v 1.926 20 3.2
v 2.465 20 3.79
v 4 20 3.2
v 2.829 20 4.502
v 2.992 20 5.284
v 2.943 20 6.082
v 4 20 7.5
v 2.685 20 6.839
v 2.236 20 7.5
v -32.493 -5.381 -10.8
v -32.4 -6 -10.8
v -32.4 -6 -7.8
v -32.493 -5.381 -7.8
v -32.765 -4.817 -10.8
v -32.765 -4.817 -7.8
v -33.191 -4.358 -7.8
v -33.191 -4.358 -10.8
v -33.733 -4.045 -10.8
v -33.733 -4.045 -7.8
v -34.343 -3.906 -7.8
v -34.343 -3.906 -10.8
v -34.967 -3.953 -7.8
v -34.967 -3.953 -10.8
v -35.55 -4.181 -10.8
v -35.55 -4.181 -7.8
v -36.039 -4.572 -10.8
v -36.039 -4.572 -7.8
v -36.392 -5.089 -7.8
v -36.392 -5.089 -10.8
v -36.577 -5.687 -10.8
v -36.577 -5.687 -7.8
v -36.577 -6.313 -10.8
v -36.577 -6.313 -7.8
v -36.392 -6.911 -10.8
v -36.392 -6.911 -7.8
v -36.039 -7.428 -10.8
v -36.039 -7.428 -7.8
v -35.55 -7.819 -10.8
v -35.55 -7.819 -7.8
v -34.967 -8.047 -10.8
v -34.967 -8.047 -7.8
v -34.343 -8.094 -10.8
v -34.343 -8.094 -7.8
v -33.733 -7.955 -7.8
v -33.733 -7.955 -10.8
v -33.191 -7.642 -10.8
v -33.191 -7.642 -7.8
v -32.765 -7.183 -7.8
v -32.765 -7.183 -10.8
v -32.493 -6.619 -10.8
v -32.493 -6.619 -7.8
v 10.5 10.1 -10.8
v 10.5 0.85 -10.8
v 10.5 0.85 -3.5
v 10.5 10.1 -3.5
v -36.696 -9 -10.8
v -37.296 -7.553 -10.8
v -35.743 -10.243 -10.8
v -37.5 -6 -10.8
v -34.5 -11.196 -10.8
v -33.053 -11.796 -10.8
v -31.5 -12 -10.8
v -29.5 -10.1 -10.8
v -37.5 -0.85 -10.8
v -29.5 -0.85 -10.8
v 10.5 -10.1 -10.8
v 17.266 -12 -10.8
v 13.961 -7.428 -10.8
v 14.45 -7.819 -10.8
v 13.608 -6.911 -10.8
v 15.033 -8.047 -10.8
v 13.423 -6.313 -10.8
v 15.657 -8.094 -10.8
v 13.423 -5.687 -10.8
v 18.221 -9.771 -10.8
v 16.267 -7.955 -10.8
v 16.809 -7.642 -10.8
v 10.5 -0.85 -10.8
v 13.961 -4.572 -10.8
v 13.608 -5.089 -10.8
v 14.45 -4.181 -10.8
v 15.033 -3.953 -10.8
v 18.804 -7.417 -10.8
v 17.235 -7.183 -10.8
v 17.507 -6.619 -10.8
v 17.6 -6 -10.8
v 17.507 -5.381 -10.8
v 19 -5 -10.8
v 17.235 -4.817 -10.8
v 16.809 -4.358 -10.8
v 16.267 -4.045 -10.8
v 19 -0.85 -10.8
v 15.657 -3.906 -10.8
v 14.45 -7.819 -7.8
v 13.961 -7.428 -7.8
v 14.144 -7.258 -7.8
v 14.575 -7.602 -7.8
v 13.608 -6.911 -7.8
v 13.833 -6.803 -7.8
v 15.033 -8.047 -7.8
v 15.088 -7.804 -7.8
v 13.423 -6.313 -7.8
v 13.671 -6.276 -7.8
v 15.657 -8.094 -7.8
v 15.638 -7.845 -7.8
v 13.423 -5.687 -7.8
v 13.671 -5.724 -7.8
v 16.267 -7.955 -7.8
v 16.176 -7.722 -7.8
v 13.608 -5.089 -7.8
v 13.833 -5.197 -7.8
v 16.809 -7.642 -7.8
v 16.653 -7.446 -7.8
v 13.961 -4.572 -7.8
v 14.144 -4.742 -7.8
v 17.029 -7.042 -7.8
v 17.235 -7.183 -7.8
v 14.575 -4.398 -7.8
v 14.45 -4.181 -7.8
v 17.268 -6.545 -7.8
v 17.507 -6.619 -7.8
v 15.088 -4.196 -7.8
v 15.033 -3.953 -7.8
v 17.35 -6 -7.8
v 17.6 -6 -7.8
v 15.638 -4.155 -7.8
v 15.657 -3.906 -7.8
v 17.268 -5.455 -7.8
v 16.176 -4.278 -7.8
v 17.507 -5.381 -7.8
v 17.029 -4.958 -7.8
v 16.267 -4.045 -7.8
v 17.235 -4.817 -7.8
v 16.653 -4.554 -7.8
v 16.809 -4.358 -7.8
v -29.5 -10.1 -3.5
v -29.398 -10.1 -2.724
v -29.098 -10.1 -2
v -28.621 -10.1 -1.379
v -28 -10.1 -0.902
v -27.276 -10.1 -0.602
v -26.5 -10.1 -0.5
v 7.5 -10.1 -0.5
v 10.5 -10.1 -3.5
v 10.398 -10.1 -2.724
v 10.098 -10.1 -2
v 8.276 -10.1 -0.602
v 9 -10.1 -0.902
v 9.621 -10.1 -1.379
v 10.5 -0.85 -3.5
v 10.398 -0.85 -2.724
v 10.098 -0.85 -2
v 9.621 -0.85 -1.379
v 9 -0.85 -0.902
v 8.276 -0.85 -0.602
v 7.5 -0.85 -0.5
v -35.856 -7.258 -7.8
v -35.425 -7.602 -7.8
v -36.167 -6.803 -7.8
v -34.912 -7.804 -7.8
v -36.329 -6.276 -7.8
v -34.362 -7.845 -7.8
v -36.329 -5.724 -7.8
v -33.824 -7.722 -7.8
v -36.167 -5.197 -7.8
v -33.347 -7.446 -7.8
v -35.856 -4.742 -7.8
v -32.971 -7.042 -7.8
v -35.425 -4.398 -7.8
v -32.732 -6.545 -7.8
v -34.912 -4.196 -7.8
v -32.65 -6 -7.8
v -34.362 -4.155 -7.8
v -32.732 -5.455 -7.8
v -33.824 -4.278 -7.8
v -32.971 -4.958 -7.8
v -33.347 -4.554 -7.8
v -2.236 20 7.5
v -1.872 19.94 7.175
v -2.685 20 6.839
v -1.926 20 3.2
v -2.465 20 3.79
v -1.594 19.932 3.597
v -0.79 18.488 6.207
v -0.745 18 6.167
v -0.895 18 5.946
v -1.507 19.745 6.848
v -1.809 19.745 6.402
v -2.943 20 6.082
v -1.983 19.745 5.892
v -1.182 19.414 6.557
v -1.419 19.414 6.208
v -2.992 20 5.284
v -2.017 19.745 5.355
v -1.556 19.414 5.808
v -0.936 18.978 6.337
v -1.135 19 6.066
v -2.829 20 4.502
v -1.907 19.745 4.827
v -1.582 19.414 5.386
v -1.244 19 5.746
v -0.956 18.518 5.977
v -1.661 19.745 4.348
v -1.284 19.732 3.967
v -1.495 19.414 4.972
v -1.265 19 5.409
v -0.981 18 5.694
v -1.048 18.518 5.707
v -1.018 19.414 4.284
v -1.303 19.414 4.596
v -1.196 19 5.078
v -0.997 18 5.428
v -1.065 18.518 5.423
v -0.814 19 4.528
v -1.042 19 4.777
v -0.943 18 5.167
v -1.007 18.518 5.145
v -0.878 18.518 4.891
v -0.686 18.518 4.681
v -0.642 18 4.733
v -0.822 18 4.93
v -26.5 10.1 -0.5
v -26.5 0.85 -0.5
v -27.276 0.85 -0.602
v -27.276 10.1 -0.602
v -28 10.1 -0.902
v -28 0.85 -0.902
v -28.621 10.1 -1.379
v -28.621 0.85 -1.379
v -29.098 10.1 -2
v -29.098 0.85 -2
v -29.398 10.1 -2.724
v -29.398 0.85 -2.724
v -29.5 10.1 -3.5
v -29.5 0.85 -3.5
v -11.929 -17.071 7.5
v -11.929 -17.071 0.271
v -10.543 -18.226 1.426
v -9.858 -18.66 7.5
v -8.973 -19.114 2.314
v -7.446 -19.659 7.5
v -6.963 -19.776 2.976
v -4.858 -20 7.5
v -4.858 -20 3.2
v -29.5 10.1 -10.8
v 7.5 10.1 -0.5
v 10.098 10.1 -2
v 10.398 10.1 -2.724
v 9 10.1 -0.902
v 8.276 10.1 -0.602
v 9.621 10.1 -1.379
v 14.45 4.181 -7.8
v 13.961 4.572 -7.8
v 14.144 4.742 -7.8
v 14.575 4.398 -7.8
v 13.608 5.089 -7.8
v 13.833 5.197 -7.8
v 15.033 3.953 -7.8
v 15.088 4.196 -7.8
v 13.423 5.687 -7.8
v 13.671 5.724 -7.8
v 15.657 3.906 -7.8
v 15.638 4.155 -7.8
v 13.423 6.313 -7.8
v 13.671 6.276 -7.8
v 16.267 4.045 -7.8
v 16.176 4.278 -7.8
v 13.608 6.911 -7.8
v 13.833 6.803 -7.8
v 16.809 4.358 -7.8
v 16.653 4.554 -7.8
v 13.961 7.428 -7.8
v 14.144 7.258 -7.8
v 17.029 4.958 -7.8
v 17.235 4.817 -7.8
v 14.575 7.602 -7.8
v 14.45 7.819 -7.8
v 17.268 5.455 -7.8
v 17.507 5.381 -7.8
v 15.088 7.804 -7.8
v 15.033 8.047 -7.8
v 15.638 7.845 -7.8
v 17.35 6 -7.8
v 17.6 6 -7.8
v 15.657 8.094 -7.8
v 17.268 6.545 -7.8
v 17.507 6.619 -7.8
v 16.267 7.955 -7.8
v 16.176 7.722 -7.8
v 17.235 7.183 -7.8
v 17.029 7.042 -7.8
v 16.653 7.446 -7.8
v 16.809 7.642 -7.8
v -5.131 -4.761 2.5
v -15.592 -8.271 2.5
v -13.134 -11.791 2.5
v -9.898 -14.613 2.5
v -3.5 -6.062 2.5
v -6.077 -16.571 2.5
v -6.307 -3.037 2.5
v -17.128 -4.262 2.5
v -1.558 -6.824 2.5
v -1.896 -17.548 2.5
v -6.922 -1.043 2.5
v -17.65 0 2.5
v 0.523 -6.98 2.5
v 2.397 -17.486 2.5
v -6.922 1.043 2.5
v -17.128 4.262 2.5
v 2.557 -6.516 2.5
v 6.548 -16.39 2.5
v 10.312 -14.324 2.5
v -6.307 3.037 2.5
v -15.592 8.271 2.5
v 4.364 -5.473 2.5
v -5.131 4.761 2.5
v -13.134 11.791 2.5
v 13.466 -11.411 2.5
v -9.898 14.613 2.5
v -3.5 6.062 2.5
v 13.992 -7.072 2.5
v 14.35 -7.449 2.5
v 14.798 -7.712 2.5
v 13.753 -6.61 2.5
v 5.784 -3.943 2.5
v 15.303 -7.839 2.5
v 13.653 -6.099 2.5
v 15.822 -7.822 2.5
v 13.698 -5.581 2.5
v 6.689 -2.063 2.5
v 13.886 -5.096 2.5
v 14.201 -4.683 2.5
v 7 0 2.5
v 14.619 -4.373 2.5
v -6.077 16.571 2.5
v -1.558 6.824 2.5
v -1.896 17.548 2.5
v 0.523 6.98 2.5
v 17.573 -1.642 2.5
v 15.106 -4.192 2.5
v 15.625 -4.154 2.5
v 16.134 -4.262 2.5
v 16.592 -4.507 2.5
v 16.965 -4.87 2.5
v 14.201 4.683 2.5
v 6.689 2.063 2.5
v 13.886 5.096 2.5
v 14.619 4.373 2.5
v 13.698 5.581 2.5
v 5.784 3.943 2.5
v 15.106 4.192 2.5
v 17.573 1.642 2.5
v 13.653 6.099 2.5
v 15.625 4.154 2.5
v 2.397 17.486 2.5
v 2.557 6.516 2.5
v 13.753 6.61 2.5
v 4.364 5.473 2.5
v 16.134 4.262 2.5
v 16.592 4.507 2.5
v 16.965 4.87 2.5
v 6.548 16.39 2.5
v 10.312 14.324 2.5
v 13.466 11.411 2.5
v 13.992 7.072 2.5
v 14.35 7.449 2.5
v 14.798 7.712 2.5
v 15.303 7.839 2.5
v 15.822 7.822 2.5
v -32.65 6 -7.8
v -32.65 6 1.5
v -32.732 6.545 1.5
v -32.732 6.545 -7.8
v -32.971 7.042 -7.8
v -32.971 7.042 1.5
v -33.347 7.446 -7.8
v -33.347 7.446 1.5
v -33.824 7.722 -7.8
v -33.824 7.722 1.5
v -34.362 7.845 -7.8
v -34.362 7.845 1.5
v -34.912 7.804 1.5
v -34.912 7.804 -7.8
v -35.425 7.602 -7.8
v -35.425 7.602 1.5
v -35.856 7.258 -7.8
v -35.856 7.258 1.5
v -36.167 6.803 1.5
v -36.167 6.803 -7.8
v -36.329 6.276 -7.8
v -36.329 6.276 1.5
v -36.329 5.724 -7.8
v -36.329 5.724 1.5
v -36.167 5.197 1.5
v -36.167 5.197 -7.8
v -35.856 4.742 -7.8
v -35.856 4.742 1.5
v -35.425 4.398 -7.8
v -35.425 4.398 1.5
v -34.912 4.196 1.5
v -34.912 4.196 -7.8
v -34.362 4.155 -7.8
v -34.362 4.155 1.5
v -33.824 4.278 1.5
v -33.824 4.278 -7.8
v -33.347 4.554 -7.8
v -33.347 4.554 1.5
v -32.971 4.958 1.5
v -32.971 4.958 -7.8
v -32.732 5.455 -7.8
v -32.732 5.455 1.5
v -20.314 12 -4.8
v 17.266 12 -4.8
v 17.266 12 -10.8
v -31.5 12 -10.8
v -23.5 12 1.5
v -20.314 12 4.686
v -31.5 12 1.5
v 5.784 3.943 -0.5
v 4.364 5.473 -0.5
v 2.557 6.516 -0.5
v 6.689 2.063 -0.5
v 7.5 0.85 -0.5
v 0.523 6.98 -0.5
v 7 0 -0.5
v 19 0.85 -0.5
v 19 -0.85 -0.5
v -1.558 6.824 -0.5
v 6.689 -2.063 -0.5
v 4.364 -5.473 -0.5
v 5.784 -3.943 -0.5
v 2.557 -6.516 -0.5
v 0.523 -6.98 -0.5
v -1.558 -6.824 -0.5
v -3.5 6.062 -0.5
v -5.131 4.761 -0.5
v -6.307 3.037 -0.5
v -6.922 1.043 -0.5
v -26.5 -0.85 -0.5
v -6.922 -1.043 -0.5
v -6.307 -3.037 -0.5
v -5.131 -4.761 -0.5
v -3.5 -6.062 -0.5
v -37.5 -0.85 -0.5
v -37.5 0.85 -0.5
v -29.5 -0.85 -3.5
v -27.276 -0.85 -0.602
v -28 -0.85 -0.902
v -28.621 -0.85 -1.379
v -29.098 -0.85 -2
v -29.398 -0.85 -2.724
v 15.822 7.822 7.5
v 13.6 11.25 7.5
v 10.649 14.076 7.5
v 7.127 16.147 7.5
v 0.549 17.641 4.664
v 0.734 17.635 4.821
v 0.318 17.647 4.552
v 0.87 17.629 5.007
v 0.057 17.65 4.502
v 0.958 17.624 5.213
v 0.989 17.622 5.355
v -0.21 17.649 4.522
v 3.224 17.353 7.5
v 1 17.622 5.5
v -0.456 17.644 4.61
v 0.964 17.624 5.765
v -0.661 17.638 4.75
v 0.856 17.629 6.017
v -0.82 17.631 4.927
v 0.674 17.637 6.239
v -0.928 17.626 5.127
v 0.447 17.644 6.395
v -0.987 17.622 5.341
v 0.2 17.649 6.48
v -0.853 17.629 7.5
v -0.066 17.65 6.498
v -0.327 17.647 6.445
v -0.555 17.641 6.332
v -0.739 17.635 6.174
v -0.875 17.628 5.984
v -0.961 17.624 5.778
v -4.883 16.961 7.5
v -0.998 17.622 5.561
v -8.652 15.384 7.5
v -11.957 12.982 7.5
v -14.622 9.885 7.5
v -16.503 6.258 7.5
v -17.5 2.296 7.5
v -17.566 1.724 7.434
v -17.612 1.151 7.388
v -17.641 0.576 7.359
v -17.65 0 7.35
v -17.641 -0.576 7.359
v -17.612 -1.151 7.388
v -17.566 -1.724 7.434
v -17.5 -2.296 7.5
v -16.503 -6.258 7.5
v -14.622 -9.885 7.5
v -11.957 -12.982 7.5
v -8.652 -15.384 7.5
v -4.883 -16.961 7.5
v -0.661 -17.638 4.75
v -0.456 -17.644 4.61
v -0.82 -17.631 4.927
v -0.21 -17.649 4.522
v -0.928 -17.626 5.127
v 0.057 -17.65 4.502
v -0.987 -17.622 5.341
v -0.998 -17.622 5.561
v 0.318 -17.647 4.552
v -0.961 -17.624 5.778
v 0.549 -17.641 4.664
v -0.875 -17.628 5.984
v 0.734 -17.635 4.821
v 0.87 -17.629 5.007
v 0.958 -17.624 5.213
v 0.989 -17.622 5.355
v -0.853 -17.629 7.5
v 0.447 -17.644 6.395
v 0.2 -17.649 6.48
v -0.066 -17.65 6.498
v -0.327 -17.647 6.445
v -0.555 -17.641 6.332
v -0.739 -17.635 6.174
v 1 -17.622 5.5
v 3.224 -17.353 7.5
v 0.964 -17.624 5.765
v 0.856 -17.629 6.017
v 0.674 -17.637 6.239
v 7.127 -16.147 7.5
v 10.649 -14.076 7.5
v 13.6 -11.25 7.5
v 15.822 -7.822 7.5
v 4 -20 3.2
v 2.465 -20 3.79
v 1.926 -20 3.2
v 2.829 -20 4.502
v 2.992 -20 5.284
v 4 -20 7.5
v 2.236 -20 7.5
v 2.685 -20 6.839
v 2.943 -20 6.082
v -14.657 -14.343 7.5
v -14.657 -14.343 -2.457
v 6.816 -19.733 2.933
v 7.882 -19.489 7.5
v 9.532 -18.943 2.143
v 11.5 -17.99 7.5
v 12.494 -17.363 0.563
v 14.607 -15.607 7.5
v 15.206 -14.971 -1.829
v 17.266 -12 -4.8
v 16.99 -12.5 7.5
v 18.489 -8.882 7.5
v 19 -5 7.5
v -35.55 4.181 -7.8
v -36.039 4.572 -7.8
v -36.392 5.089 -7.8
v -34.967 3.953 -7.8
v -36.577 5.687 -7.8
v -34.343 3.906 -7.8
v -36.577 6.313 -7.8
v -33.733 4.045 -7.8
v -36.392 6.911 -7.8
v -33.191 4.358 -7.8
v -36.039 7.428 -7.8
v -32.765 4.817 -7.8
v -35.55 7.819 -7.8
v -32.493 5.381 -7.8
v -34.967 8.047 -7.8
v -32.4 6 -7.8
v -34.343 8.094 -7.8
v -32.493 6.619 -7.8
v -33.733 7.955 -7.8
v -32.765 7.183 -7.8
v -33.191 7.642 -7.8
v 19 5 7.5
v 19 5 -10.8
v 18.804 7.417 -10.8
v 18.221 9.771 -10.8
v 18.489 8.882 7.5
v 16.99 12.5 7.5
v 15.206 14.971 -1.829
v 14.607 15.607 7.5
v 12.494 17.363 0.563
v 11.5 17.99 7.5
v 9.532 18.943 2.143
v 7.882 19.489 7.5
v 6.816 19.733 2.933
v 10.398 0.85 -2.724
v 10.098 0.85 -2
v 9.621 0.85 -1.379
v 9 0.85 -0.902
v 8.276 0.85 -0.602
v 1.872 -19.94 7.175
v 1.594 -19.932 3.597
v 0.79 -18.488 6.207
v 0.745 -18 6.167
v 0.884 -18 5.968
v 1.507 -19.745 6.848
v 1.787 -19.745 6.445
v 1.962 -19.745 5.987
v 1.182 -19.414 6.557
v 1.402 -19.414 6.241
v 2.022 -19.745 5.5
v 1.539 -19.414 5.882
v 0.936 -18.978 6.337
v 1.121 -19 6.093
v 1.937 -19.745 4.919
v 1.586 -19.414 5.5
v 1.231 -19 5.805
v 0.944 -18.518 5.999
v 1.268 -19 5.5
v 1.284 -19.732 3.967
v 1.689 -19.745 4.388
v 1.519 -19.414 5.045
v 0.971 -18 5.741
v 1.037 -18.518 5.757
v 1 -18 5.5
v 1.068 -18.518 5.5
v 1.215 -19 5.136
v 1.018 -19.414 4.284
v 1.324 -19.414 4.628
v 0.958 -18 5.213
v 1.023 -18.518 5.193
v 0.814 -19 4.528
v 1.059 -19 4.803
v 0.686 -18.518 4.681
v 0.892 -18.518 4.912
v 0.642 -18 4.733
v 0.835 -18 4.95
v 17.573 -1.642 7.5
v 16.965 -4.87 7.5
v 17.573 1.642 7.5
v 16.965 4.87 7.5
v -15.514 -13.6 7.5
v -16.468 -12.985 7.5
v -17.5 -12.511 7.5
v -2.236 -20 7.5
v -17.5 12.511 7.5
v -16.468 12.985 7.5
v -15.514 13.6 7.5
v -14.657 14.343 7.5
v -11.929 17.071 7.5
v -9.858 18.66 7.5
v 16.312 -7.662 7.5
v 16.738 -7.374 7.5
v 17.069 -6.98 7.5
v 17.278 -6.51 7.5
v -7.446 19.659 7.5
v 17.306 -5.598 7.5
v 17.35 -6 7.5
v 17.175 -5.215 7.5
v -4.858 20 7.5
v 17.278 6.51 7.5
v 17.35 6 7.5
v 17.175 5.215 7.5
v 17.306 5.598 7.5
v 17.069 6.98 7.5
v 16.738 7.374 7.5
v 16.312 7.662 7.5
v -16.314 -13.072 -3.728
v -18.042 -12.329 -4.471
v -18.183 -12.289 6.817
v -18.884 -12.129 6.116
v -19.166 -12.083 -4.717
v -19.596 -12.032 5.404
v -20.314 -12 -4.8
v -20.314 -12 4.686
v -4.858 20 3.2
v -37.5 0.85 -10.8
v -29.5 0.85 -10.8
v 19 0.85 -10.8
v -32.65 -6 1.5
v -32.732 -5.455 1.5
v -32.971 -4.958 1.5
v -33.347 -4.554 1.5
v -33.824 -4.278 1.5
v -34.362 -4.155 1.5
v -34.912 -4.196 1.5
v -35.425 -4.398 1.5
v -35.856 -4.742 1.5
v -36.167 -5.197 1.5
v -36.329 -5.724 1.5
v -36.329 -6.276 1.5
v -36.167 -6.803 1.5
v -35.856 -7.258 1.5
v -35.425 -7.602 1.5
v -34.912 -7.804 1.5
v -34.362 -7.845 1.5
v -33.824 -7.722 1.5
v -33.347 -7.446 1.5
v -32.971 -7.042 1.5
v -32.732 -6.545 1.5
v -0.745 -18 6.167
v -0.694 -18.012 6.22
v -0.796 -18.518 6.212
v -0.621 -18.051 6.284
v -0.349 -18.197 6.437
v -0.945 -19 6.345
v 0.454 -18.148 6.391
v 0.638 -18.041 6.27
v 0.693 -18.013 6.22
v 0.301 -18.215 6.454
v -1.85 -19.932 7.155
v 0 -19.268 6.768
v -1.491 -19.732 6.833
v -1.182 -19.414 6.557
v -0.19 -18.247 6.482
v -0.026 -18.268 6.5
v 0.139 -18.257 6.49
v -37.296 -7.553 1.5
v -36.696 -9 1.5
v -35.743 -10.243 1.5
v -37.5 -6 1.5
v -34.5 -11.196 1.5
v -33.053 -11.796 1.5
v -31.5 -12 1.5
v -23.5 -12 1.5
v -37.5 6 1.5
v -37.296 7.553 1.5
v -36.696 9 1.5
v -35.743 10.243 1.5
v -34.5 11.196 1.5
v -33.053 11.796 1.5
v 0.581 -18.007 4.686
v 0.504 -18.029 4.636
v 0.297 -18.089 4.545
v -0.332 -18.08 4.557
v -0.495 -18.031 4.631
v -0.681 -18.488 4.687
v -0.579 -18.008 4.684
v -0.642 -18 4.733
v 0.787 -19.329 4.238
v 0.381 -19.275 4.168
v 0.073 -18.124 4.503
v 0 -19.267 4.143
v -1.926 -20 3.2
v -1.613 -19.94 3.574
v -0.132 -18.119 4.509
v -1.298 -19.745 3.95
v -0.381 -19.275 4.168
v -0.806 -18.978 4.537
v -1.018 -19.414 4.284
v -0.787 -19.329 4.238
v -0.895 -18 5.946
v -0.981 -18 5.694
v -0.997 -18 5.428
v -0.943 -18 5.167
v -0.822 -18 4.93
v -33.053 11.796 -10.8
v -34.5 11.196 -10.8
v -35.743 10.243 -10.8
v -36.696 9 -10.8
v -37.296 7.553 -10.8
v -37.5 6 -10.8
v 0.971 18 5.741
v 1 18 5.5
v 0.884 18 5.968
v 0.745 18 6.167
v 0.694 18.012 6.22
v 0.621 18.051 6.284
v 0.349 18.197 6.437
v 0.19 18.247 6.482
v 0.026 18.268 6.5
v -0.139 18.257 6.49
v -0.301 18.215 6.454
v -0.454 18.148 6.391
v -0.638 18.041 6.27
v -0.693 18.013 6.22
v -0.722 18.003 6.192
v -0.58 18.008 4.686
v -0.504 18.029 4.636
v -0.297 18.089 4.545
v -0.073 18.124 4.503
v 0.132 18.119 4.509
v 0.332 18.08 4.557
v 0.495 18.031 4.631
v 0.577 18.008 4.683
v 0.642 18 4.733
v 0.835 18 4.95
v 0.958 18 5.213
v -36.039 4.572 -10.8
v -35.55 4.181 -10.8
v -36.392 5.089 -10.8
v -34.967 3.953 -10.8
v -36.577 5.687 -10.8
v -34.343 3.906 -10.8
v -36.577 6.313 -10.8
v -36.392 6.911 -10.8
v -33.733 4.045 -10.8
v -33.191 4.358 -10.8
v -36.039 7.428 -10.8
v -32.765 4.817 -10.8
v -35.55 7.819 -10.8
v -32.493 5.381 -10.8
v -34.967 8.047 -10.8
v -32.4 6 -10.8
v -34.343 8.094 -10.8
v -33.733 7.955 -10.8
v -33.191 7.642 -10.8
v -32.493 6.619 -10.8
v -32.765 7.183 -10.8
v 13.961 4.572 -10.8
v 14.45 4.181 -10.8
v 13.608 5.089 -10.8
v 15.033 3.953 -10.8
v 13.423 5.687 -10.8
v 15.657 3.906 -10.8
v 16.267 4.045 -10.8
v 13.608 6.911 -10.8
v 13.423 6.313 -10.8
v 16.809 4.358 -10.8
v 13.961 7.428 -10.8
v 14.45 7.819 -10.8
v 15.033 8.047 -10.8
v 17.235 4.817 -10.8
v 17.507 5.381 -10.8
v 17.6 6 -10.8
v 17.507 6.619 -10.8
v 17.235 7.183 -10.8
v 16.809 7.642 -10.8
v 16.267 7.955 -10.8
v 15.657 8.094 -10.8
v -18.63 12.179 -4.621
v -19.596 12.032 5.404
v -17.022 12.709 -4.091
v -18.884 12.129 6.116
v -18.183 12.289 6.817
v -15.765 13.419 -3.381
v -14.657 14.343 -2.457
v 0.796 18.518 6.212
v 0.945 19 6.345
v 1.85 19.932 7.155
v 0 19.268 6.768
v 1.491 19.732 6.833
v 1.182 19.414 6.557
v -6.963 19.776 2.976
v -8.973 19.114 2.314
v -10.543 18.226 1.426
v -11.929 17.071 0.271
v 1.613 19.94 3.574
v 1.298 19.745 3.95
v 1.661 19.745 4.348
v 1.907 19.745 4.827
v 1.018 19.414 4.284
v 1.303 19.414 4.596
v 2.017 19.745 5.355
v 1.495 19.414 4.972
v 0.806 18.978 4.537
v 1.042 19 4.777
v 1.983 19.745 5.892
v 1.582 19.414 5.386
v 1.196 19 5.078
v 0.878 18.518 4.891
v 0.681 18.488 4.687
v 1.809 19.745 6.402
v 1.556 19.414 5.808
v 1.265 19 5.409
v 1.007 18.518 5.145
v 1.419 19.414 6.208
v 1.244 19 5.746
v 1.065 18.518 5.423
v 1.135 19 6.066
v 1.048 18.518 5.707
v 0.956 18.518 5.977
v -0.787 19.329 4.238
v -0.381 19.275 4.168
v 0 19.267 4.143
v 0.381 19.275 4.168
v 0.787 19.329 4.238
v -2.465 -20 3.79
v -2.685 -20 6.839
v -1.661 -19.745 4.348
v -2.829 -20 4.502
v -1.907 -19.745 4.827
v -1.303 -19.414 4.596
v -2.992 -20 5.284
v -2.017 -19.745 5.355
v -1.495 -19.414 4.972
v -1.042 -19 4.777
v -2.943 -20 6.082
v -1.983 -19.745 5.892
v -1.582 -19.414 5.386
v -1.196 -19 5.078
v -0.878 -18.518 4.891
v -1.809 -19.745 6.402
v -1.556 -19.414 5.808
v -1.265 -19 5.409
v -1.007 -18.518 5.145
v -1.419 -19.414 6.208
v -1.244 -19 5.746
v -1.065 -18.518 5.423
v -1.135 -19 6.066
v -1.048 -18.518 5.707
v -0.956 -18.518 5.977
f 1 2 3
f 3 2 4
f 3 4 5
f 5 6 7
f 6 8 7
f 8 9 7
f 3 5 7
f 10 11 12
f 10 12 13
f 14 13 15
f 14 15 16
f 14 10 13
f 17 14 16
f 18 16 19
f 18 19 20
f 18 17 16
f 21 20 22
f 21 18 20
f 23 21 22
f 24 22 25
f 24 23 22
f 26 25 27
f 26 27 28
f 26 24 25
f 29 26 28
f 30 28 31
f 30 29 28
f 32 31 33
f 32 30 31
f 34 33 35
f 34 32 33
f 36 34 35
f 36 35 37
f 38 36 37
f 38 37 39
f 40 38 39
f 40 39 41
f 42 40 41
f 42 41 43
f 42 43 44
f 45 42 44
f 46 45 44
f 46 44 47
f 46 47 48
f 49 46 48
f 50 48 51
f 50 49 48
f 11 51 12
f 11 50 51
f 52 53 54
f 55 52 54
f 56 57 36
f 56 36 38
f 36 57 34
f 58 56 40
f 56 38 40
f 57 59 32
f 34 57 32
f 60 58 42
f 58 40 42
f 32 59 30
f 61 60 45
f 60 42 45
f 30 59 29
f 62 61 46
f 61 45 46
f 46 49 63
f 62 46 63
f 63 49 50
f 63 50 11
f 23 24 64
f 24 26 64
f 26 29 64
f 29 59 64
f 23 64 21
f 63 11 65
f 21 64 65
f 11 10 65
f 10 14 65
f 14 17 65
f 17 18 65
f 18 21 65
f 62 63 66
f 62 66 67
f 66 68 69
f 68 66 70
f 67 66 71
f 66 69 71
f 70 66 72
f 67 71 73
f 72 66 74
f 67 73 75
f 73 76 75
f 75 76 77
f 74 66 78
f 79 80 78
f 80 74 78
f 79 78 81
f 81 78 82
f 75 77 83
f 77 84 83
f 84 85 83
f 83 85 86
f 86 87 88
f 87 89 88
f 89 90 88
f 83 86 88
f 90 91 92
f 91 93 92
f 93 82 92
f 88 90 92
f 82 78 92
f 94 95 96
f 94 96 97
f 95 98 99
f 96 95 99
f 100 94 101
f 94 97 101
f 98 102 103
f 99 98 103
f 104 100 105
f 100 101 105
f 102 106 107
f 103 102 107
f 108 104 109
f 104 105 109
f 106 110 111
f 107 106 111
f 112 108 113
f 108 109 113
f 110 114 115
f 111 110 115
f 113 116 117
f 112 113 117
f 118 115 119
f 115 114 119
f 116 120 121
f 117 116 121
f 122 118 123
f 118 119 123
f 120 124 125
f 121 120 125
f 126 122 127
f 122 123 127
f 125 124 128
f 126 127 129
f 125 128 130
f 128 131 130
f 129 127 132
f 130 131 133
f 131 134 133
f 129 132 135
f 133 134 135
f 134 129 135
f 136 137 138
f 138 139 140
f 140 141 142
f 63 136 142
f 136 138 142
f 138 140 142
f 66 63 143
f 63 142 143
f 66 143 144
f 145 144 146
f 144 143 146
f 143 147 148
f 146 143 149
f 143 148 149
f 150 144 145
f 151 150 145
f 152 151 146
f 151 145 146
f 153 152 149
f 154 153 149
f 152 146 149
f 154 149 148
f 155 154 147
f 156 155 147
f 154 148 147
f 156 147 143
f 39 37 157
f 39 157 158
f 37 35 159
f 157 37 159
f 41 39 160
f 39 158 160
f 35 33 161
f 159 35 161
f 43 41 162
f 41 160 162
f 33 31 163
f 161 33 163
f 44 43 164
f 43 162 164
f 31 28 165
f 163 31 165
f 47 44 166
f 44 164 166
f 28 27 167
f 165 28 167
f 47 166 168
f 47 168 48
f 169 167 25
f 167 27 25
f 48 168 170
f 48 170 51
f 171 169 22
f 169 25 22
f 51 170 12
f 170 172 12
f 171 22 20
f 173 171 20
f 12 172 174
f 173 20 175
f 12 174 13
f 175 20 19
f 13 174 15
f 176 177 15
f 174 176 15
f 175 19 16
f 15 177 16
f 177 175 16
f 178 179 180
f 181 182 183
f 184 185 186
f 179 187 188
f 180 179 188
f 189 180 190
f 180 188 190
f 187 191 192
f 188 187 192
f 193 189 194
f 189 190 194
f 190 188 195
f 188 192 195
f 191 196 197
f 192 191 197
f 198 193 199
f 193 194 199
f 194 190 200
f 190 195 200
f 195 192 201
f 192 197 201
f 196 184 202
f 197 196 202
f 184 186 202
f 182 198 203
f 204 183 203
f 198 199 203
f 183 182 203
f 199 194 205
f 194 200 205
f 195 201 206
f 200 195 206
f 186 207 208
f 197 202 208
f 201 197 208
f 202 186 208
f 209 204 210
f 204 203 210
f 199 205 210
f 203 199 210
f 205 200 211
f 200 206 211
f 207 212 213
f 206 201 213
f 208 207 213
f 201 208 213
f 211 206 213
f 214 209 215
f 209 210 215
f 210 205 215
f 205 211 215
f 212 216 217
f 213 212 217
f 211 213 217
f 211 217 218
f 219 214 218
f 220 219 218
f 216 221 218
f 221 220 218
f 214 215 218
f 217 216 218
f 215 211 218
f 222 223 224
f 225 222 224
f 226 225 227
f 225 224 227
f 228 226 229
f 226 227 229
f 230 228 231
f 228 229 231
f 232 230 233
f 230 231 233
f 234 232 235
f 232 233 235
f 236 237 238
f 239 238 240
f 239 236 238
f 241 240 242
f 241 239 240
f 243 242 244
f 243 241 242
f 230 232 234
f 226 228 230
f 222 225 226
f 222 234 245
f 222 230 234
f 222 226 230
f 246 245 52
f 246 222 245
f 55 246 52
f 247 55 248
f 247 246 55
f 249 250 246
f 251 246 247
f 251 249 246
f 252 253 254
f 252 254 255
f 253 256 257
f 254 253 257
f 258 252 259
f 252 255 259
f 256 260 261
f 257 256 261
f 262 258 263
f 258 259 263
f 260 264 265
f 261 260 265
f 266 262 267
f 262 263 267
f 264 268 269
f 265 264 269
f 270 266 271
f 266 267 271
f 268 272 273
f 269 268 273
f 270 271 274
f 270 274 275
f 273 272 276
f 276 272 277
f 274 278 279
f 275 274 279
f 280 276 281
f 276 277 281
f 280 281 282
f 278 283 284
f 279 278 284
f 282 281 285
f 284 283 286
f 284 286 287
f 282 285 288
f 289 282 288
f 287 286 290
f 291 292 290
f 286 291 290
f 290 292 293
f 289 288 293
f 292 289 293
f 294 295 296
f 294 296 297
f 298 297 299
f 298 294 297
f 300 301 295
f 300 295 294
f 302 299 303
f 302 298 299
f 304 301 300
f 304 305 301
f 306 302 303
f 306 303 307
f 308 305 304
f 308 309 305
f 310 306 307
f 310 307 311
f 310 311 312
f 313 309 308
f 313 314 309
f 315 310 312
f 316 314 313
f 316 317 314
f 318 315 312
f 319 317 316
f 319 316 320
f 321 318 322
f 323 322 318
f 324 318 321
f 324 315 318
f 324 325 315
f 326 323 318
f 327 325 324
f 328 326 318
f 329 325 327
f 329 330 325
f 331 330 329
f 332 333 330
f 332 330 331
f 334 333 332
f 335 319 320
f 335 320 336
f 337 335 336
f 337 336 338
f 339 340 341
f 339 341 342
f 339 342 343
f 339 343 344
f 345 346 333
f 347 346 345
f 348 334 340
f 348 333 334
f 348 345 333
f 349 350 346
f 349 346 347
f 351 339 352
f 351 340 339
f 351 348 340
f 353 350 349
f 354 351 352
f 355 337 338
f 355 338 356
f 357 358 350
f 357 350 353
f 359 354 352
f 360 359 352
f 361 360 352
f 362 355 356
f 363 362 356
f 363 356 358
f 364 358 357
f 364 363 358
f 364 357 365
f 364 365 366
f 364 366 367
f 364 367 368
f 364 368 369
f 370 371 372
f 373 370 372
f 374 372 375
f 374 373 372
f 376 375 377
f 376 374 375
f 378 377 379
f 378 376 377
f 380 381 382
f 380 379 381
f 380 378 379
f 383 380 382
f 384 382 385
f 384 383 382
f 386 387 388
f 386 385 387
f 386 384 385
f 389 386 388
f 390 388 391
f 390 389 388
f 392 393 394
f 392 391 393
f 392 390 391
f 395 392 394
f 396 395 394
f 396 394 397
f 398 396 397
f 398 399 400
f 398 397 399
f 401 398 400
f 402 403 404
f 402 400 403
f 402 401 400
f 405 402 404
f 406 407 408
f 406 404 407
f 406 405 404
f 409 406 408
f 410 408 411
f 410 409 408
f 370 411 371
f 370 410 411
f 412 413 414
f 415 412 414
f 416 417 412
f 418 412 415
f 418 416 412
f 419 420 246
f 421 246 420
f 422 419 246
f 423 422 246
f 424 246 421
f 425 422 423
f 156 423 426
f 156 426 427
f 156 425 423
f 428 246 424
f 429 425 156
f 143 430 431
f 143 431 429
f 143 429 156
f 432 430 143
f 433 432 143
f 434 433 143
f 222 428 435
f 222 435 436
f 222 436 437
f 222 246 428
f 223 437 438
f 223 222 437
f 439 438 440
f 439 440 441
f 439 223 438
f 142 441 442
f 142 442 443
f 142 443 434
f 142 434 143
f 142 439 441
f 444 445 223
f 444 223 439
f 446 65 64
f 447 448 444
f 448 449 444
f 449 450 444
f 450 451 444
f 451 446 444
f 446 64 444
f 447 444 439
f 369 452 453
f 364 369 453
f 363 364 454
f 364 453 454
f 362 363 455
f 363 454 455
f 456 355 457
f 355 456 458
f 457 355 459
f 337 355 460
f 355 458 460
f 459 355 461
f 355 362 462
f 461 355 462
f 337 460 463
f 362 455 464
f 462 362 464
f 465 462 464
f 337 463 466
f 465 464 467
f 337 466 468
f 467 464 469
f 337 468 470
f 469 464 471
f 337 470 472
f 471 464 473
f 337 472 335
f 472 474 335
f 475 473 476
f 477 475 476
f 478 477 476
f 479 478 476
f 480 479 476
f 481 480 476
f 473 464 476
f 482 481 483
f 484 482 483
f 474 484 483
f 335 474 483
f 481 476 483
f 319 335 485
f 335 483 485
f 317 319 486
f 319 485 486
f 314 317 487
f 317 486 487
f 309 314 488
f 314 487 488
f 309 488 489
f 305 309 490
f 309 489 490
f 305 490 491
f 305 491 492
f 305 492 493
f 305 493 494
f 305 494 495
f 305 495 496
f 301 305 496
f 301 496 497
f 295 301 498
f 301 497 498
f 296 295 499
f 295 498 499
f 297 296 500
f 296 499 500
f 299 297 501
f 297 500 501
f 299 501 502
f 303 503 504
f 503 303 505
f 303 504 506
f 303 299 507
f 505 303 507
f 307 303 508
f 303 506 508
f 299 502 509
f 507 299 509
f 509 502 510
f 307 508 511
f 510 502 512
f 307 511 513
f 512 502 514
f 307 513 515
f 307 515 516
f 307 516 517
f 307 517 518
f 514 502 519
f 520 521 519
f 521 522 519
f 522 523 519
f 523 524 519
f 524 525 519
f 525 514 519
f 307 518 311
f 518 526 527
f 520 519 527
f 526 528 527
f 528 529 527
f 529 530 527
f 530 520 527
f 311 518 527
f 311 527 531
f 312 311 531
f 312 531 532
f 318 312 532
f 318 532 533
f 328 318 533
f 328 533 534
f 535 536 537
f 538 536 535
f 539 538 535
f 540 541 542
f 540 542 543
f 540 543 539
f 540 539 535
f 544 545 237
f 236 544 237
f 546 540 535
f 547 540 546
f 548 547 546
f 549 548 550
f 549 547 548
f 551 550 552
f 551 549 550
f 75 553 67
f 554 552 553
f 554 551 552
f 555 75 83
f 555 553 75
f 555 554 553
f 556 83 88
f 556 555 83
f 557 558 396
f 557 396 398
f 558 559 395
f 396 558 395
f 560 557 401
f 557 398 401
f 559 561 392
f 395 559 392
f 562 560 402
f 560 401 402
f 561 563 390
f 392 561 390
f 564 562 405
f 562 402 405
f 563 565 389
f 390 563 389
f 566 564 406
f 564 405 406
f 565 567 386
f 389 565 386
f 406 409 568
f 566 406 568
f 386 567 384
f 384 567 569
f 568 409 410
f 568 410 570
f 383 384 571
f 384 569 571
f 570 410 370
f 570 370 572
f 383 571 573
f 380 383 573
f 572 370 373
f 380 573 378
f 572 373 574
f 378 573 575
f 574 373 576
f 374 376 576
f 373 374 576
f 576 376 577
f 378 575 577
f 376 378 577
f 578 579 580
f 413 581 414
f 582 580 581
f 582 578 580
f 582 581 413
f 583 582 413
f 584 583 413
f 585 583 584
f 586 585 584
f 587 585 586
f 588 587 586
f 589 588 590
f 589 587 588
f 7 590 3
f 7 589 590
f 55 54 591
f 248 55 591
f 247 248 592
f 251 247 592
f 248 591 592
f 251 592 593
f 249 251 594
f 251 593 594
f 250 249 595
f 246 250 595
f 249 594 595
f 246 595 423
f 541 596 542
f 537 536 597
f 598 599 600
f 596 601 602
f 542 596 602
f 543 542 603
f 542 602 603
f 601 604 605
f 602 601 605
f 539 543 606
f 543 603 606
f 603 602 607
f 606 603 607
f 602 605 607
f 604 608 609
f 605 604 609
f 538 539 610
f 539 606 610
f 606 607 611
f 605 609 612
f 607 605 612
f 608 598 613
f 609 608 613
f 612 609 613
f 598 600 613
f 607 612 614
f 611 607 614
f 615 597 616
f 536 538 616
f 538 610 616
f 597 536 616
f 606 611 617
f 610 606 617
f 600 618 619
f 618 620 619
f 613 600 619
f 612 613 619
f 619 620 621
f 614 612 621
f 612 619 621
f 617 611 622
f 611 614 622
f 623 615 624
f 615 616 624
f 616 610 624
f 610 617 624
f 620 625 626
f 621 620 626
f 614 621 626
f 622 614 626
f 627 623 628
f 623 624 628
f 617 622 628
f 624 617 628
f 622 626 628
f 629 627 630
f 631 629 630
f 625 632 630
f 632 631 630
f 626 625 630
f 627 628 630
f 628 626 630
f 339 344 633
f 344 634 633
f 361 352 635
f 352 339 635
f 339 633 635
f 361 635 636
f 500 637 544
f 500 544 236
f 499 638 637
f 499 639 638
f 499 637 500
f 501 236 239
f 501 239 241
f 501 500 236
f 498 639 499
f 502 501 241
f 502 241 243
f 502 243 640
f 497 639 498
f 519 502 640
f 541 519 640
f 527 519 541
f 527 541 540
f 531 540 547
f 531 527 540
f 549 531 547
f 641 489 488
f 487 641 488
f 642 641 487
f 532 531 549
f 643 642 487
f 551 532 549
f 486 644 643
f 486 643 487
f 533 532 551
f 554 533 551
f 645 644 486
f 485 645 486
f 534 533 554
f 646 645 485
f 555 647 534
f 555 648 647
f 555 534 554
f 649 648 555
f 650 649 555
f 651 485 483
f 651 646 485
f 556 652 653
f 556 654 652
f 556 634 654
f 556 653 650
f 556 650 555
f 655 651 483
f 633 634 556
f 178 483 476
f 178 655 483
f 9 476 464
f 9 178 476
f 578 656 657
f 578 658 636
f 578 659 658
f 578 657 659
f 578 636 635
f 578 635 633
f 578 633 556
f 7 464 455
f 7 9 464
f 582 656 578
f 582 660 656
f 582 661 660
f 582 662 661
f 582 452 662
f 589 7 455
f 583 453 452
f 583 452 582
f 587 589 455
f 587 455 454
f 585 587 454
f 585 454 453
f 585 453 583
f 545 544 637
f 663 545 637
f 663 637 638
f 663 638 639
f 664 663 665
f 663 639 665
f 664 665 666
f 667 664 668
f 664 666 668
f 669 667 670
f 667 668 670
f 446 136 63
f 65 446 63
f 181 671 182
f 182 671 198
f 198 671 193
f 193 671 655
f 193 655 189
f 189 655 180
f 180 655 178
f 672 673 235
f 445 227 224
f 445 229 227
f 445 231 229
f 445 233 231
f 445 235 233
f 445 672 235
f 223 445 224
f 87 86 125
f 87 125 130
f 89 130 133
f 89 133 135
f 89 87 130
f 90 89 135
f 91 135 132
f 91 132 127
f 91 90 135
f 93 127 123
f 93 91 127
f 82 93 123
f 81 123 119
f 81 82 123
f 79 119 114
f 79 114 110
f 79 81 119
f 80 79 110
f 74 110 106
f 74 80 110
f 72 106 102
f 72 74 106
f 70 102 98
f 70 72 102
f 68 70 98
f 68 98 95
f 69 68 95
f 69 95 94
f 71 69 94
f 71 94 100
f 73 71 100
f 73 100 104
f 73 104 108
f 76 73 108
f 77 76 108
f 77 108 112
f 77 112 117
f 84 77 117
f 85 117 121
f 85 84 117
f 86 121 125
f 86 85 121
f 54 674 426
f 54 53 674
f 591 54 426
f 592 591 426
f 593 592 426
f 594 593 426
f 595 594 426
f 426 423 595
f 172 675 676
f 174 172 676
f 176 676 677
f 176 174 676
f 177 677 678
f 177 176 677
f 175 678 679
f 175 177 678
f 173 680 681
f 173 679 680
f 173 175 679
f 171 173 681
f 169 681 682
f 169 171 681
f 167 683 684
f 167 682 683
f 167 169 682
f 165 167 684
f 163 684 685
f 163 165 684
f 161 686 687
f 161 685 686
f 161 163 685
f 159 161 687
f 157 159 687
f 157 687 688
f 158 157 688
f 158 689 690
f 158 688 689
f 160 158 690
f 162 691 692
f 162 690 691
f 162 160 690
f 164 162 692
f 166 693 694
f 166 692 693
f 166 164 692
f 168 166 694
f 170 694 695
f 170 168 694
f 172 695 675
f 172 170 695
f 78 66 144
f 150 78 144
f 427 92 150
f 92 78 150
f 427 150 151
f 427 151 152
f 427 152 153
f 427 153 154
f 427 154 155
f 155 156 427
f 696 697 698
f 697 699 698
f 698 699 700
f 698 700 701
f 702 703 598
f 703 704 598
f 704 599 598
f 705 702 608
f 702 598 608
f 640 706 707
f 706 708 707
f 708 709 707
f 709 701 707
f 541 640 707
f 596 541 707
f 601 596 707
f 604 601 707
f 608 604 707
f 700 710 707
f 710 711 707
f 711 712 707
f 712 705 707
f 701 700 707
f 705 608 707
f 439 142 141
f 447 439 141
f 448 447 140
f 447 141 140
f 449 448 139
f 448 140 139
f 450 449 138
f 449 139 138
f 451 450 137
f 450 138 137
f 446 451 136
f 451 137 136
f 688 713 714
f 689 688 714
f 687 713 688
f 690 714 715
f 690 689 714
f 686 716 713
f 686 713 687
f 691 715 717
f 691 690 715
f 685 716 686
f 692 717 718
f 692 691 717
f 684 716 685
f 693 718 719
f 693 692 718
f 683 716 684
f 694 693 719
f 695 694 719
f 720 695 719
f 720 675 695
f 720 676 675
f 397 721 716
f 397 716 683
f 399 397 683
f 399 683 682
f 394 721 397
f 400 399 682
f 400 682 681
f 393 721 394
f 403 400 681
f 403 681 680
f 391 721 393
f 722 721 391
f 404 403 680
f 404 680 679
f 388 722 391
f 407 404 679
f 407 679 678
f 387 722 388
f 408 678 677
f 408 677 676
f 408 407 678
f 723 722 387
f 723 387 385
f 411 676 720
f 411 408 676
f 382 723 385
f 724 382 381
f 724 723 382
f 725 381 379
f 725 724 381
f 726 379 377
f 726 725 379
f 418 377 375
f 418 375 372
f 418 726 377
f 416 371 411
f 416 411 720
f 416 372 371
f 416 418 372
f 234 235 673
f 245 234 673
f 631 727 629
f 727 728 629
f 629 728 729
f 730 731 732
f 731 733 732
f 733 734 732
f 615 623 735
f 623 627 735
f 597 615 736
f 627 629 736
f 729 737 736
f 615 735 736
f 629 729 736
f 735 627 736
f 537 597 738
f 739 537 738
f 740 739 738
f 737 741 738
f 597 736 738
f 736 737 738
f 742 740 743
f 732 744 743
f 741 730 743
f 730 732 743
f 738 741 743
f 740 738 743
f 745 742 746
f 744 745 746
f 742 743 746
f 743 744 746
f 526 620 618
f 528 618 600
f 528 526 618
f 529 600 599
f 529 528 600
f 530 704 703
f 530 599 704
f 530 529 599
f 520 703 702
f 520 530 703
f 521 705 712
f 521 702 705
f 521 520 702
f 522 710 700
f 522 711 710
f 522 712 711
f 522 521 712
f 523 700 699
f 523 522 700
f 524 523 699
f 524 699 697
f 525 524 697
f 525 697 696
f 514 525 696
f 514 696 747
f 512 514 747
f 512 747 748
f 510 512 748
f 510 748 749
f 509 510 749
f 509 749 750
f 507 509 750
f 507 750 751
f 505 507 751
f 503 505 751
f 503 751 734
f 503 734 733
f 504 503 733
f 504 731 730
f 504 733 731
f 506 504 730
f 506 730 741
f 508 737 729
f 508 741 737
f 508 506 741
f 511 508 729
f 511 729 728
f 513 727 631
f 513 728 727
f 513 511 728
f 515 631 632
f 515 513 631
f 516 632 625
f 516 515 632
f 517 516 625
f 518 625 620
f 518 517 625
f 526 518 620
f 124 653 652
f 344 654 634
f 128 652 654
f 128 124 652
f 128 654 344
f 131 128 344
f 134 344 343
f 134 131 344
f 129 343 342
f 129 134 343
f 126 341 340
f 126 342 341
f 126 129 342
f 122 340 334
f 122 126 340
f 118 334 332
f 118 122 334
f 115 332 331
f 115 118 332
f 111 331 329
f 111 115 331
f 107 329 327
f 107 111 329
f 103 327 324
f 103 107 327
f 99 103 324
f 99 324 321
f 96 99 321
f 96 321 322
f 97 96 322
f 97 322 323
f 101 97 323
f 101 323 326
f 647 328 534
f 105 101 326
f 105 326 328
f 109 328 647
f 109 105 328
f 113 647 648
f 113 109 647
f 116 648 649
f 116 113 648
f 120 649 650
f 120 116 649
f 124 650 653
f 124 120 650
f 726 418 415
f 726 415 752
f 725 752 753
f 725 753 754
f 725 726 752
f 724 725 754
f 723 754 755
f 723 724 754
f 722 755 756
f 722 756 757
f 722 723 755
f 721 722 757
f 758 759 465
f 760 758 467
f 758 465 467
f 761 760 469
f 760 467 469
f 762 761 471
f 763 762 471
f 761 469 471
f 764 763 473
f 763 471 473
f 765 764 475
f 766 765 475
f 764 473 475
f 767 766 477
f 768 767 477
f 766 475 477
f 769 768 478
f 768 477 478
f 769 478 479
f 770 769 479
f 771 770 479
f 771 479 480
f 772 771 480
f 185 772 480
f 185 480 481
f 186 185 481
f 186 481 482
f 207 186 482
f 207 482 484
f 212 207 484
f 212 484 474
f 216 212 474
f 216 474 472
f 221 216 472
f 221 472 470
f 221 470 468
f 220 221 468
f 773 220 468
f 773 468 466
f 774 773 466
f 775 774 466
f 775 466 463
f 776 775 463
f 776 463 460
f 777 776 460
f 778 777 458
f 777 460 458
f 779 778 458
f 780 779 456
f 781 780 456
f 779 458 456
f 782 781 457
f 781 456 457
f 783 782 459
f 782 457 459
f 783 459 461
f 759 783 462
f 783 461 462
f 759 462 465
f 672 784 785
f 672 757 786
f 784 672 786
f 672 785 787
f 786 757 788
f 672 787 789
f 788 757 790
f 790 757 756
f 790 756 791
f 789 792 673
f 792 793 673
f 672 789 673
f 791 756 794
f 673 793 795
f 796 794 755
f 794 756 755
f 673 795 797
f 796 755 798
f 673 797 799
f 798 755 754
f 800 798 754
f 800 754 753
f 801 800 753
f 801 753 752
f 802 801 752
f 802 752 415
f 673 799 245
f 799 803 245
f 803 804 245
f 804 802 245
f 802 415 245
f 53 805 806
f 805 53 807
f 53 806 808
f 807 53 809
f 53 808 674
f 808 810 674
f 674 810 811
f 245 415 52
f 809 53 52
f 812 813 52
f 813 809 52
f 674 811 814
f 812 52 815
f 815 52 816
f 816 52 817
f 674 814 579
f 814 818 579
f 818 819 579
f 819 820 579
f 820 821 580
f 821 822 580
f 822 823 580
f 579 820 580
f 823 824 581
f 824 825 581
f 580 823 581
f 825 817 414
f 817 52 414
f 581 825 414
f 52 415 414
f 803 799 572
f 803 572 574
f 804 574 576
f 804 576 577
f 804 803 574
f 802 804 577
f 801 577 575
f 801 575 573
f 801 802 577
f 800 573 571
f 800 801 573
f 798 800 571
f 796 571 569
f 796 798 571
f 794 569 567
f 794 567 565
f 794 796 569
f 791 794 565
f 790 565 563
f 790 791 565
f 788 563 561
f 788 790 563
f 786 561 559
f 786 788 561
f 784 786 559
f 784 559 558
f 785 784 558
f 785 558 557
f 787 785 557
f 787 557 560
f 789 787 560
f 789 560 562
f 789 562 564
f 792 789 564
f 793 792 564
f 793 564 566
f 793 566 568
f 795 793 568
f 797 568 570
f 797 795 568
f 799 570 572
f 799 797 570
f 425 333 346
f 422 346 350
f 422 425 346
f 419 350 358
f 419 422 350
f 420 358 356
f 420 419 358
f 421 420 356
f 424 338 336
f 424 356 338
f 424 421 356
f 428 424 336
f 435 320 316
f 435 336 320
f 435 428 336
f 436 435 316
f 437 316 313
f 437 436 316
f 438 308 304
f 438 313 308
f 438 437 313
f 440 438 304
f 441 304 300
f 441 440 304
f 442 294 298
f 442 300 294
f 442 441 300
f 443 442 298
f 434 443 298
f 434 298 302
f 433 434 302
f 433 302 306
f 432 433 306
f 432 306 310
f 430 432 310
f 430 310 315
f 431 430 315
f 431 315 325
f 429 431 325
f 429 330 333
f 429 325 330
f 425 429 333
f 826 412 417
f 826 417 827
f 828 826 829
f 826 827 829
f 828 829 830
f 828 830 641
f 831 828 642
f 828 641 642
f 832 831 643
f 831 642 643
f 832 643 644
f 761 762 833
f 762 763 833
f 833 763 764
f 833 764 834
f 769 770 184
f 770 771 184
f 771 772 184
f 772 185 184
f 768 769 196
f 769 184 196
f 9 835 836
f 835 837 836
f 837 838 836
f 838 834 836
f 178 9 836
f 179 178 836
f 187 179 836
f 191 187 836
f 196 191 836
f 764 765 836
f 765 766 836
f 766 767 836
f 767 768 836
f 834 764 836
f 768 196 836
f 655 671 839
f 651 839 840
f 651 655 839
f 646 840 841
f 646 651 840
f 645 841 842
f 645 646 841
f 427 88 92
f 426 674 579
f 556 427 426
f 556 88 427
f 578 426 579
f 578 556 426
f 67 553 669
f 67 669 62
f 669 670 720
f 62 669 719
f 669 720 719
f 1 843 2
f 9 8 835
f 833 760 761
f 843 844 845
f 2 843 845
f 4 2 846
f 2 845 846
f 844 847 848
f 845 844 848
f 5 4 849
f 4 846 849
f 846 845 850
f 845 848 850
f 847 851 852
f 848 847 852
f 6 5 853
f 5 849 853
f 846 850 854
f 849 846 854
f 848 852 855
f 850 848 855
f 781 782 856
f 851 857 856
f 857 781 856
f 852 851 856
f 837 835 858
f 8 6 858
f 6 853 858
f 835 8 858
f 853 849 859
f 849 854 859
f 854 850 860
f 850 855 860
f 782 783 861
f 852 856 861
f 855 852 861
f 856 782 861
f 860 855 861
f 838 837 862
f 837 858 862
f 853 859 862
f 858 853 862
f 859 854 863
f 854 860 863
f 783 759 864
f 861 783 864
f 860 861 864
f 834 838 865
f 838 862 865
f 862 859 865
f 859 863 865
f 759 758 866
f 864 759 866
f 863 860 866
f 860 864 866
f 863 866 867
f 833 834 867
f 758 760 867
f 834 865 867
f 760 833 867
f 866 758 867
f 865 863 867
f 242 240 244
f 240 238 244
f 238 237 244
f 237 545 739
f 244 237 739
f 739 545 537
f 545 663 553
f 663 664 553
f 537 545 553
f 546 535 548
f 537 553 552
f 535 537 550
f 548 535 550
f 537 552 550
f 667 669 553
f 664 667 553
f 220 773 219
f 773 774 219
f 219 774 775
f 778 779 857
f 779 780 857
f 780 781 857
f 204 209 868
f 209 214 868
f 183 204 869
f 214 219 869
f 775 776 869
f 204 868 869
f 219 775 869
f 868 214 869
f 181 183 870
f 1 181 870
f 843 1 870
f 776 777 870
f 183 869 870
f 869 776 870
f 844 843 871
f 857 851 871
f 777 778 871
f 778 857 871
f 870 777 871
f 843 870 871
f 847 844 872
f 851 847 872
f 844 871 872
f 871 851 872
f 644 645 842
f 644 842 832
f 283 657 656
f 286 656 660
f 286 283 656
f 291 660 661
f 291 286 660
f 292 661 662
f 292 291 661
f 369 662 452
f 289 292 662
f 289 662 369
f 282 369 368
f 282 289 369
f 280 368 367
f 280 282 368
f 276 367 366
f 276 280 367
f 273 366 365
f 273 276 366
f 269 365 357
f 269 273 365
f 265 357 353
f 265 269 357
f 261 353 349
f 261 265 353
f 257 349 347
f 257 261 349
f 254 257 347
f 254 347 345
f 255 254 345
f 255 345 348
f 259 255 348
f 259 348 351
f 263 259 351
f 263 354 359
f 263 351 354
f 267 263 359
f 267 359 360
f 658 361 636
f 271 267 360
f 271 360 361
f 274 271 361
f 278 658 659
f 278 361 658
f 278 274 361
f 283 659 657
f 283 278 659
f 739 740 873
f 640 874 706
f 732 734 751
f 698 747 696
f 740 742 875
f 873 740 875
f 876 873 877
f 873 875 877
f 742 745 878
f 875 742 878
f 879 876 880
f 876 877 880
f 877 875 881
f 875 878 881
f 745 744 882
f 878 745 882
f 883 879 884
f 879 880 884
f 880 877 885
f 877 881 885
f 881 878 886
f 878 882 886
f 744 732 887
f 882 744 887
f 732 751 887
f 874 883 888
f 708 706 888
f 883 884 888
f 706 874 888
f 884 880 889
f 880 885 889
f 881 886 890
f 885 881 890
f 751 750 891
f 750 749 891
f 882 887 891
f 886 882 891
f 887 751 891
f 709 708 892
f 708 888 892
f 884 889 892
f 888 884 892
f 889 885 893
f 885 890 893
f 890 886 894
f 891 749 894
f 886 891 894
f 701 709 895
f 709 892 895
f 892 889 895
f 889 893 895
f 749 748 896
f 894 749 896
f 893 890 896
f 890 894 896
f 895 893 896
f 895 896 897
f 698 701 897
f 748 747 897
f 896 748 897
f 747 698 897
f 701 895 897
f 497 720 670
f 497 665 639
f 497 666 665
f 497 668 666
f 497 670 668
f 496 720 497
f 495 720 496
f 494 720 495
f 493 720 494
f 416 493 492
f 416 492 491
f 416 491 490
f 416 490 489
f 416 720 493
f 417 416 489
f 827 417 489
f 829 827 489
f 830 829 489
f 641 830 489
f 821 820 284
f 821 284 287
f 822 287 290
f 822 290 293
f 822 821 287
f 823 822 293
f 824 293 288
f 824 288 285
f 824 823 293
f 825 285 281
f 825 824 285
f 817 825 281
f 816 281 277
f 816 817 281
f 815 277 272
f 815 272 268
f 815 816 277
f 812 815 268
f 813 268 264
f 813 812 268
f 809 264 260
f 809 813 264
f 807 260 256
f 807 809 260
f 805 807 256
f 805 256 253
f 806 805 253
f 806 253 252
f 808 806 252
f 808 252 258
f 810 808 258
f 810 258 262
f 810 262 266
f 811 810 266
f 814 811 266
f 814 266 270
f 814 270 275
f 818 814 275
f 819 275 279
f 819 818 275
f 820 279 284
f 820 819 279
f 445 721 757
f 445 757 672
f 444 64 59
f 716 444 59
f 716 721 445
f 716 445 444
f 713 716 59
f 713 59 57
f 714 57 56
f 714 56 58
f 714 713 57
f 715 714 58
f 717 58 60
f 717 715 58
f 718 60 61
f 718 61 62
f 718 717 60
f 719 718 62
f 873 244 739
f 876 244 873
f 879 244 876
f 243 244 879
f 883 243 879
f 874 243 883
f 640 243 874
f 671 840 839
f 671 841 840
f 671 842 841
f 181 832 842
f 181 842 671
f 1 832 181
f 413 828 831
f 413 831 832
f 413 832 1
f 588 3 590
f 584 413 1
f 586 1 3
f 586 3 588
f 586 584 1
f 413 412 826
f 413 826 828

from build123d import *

# Parameters (mm, degrees)
SKETCH035_R          = 7
SKETCH035_R_2        = 1.85
PAD031_DEPTH         = 8
PAD031_DEPTH_BACK    = 10.3
POCKET036_DEPTH      = 10.1
SKETCH070_W          = 1.7
SKETCH070_H          = 20
POCKET037_DEPTH      = 56.501
SKETCH043_R          = 17.65
POCKET038_DEPTH      = 5
POCKET039_DEPTH      = 20.001
POCKET039_DEPTH_BACK = 20.001
POCKET040_DEPTH      = 167.7091
POCKET040_DEPTH_BACK = 175.2091
SKETCH073_R          = 1
POCKET041_DEPTH      = 20.001
POCKET041_DEPTH_BACK = 20.001
FILLET006_R          = 2
SKETCH074_R          = 2.1
POCKET042_DEPTH      = 3


with BuildPart() as part:
    # Sketch035 → Pad031 (new body, two sides)
    with BuildSketch(Plane.XY) as pad031_sk:
        with BuildLine():
            Line((-24.5, 6), (-24.5, -6))
            ThreePointArc((-24.5, -6), (-22.742641, -10.242641), (-18.5, -12))
            Line((-7.313708, -12), (-18.5, -12))
            ThreePointArc((-1.656854, -14.343146), (-4.252241, -12.608964), (-7.313708, -12))
            Line((-1.656854, -14.343146), (1.071068, -17.071068))
            ThreePointArc((1.071068, -17.071068), (4.315301, -19.238795), (8.142136, -20))
            Line((8.142136, -20), (17, -20))
            ThreePointArc((17, -20), (27.606602, -15.606602), (32, -5))
            Line((32, -5), (32, 5))
            ThreePointArc((32, 5), (27.606602, 15.606602), (17, 20))
            Line((8.142136, 20), (17, 20))
            ThreePointArc((8.142136, 20), (4.315301, 19.238795), (1.071068, 17.071068))
            Line((1.071068, 17.071068), (-1.656854, 14.343146))
            ThreePointArc((-7.313708, 12), (-4.252241, 12.608964), (-1.656854, 14.343146))
            Line((-7.313708, 12), (-18.5, 12))
            ThreePointArc((-18.5, 12), (-22.742641, 10.242641), (-24.5, 6))
        make_face()
        with Locations((13, 0)):
            Circle(SKETCH035_R, mode=Mode.SUBTRACT)
        with Locations((-21.5, 6)):
            Circle(SKETCH035_R_2, mode=Mode.SUBTRACT)
        with Locations((-21.5, -6)):
            Circle(SKETCH035_R_2, mode=Mode.SUBTRACT)
        with Locations((28.5, 6)):
            Circle(SKETCH035_R_2, mode=Mode.SUBTRACT)
        with Locations((28.5, -6)):
            Circle(SKETCH035_R_2, mode=Mode.SUBTRACT)
    extrude(amount=PAD031_DEPTH)
    extrude(pad031_sk.sketch, amount=-PAD031_DEPTH_BACK)

    # Sketch069 → Pocket036 (cut, symmetric)
    with BuildSketch(Plane.XZ):
        with BuildLine():
            Line((-16.5, -3), (-16.5, -20))
            Line((-16.5, -20), (23.5, -20))
            Line((23.5, -20), (23.5, -3))
            ThreePointArc((23.5, -3), (22.62132, -0.87868), (20.5, 0))
            Line((20.5, 0), (-13.5, 0))
            ThreePointArc((-13.5, 0), (-15.62132, -0.87868), (-16.5, -3))
        make_face()
    extrude(amount=POCKET036_DEPTH, both=True, mode=Mode.SUBTRACT)

    # Sketch070 (on Face7 of Pocket036) → Pocket037 (cut, through all)
    with BuildSketch(Plane(origin=(-24.5, 0, 0), x_dir=(0, -1, 0), z_dir=(-1, 0, 0))):
        with Locations((0, -10)):
            Rectangle(SKETCH070_W, SKETCH070_H)
    extrude(amount=-POCKET037_DEPTH, mode=Mode.SUBTRACT)

    # Sketch043 (on Face5 of Pocket037) → Pocket038 (cut)
    with BuildSketch(Plane.XY.offset(8)):
        with Locations((13, 0)):
            Circle(SKETCH043_R)
    extrude(amount=-POCKET038_DEPTH, mode=Mode.SUBTRACT)

    # Sketch071 → Pocket039 (cut, two sides)
    with BuildSketch(Plane.XZ) as pocket039_sk:
        Polygon((-24.5, 8), (-24.5, 2), (-10.5, 2), (-4.5, 8), align=None)
    extrude(amount=-POCKET039_DEPTH, mode=Mode.SUBTRACT)
    extrude(pocket039_sk.sketch, amount=POCKET039_DEPTH_BACK, mode=Mode.SUBTRACT)

    # Sketch072 → Pocket040 (cut, two sides)
    with BuildSketch(Plane.YZ) as pocket040_sk:
        Polygon((-20, -10.3), (-12, -10.3), (-12, -4.3), (-20, 3.7), align=None)
    pocket040 = extrude(amount=-POCKET040_DEPTH, mode=Mode.SUBTRACT) + extrude(pocket040_sk.sketch, amount=POCKET040_DEPTH_BACK, mode=Mode.SUBTRACT)

    # Mirrored005: Pocket040 across Sketch072 V_Axis
    add(pocket040.mirror(Plane(origin=(0, 0, 0), x_dir=(1, 0, 0), z_dir=(0, 1, 0))), mode=Mode.SUBTRACT)

    # Sketch073 → Pocket041 (cut, two sides)
    with BuildSketch(Plane.XZ) as pocket041_sk:
        with Locations((13, 6)):
            Circle(SKETCH073_R)
    extrude(amount=-POCKET041_DEPTH, mode=Mode.SUBTRACT)
    extrude(pocket041_sk.sketch, amount=POCKET041_DEPTH_BACK, mode=Mode.SUBTRACT)

    # Fillet006
    fillet006_edges = [part.edges().sort_by_distance(p)[0] for p in [
        (12, -20, 6),
        (12, 20, 6),
    ]]
    fillet(fillet006_edges, radius=FILLET006_R)

    # Sketch074 → Pocket042 (cut)
    with BuildSketch(Plane.XY.offset(-10.3)):
        with Locations((-21.5, 6)):
            Circle(SKETCH074_R)
        with Locations((-21.5, -6)):
            Circle(SKETCH074_R)
        with Locations((28.5, -6)):
            Circle(SKETCH074_R)
        with Locations((28.5, 6)):
            Circle(SKETCH074_R)
    extrude(amount=POCKET042_DEPTH, mode=Mode.SUBTRACT)


with BuildPart() as part_1:
    # Body018 placement: moved
    add(part.part.moved(Location((-13, 0, -0.5))))


solid = part_1.part
